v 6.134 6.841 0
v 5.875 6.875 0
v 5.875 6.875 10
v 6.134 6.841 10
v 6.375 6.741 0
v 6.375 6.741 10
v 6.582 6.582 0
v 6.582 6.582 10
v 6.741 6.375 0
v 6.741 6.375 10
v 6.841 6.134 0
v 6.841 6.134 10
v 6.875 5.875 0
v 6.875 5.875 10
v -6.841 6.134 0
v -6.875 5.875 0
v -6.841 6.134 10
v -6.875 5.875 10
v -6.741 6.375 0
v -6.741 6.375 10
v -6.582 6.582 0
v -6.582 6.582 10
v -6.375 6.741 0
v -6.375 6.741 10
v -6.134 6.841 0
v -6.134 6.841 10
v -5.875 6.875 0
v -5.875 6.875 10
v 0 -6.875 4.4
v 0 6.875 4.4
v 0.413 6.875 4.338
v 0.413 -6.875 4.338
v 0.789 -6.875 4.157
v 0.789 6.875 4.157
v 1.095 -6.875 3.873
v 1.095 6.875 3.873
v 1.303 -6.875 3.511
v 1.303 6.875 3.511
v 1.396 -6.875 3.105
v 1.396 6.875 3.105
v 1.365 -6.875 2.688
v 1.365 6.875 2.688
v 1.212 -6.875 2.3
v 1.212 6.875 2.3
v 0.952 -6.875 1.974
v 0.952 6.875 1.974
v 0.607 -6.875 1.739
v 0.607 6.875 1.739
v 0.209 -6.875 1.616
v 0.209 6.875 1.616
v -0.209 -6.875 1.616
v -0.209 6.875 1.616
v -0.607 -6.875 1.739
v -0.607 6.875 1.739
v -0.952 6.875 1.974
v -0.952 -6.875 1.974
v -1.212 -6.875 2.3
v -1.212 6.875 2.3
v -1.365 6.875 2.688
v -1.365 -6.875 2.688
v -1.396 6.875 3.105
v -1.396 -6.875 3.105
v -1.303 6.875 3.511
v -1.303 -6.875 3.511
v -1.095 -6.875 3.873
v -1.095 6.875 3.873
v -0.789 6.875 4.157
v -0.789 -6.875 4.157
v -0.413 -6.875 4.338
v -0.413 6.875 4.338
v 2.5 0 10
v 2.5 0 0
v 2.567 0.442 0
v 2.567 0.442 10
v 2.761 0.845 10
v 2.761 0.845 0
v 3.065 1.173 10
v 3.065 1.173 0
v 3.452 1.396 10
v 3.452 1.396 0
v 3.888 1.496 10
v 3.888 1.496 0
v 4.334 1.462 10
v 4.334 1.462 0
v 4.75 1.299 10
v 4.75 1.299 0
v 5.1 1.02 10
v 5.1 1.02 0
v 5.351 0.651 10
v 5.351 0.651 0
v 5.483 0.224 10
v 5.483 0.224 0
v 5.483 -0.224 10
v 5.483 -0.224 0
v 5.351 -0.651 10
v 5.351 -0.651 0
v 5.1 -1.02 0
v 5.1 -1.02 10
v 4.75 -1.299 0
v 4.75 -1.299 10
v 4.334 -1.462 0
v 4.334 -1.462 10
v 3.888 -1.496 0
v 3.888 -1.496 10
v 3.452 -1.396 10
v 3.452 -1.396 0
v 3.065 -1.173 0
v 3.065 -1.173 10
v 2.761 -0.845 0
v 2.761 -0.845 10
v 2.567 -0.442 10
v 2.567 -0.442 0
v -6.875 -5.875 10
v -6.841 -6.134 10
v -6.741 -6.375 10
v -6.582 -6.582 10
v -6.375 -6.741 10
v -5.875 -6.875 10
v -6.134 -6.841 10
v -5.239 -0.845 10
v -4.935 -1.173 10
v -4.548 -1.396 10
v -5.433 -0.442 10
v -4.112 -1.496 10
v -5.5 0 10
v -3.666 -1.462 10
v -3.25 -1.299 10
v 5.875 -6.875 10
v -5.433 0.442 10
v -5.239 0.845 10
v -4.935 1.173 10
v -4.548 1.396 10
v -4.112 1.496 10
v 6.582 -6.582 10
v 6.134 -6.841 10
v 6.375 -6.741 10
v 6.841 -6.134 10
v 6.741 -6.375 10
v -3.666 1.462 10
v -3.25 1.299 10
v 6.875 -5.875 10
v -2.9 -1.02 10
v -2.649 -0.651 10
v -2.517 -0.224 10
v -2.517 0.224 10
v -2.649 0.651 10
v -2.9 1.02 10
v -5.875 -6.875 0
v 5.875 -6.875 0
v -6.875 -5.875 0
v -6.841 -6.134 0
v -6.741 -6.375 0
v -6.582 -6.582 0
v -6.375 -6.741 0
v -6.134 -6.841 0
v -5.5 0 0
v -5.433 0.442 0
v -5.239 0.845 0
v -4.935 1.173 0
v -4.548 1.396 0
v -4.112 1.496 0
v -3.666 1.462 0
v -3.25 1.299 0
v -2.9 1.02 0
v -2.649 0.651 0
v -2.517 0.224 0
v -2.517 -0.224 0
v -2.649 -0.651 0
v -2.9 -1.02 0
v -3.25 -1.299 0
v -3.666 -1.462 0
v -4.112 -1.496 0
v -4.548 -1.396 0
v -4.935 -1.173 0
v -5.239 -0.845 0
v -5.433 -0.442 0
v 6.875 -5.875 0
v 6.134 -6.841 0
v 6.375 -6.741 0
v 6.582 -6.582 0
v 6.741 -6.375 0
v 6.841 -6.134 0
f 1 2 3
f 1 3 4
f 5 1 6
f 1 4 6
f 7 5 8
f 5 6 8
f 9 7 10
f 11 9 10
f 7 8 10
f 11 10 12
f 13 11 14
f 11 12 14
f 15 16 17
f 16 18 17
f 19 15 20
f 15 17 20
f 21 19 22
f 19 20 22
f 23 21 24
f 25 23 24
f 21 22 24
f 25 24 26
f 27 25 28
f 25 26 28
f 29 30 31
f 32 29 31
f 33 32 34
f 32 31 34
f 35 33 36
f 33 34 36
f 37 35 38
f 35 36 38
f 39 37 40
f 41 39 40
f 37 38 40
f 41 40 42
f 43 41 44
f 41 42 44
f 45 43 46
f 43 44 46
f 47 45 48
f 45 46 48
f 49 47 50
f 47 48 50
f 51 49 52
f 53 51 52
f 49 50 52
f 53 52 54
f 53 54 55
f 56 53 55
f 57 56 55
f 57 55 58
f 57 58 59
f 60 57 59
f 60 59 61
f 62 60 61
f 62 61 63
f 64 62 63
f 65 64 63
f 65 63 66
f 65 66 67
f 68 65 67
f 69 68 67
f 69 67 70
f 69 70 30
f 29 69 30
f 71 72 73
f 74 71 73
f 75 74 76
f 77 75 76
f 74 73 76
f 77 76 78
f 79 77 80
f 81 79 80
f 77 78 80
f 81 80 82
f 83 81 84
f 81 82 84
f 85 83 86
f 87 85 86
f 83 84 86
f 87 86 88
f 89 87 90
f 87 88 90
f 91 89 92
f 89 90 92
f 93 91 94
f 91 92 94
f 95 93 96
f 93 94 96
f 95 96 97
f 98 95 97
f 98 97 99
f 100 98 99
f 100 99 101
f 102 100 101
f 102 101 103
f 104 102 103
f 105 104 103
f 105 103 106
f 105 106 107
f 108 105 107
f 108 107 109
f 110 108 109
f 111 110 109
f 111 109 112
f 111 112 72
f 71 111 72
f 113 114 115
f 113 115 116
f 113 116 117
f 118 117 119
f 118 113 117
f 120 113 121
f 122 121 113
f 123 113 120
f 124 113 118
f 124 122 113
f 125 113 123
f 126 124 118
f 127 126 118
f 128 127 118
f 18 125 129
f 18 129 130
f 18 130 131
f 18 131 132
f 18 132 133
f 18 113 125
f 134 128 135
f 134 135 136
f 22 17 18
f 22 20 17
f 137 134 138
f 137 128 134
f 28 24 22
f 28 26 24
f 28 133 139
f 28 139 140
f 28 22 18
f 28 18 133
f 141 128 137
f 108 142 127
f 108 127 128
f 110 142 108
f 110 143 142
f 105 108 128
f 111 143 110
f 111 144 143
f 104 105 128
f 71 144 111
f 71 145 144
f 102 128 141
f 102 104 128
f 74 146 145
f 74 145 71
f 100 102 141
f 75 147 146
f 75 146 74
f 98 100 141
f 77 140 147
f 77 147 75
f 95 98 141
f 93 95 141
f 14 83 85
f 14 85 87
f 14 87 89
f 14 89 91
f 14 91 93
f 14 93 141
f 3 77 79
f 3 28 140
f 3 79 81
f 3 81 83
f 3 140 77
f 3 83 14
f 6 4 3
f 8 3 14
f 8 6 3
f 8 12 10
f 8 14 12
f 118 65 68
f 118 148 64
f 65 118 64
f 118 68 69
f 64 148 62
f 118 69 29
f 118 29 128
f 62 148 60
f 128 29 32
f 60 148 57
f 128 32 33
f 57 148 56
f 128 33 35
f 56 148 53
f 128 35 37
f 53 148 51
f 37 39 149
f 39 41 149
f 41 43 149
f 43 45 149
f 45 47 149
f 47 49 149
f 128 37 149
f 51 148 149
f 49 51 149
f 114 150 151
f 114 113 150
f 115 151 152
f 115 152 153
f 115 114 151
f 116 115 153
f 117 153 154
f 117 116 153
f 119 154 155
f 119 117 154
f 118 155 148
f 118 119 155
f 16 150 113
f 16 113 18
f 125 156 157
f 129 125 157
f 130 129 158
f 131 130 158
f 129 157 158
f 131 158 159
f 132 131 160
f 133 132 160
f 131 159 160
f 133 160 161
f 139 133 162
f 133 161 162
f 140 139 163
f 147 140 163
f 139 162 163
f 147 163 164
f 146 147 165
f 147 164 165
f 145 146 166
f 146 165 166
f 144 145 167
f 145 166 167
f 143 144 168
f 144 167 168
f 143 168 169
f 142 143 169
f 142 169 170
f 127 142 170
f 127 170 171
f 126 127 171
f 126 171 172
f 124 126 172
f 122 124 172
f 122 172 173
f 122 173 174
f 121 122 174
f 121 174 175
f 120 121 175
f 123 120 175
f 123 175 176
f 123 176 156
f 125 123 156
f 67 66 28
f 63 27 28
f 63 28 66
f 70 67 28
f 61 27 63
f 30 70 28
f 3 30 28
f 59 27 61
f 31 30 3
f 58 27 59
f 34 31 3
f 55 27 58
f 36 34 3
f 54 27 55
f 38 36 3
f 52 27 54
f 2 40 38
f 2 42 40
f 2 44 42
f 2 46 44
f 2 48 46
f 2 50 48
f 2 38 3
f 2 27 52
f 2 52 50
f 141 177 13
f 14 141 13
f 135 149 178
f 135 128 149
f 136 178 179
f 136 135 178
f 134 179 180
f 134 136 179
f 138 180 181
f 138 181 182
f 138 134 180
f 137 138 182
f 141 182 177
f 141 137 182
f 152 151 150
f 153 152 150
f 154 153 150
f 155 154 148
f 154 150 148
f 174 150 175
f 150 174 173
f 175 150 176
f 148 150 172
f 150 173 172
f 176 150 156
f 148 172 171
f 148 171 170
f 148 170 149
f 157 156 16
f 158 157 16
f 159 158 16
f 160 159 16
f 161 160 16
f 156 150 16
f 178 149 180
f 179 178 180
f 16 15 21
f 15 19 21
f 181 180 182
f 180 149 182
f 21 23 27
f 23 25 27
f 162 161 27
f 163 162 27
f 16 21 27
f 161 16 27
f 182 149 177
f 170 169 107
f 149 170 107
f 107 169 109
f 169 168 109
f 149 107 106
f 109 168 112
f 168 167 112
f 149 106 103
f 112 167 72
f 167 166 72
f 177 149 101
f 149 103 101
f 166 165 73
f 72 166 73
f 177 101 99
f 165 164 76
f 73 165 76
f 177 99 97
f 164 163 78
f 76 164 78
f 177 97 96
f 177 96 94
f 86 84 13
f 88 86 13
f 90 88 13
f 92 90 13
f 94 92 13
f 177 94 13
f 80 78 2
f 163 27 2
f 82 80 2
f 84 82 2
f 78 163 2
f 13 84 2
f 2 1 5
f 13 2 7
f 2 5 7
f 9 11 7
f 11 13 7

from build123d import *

# Parameters (mm, degrees)
SKETCH1_W           = 13.75
SKETCH1_H           = 13.75
BOSS_EXTRUDE1_DEPTH = 10
SKETCH3_R           = 1.4
CUT_EXTRUDE1_DEPTH  = 19.339250939
SKETCH2_R           = 1.5
CUT_EXTRUDE2_DEPTH  = 14.947446003
FILLET1_R           = 1


with BuildPart() as part:
    # Sketch1 → Boss-Extrude1 (new body)
    with BuildSketch(Plane.XY):
        Rectangle(SKETCH1_W, SKETCH1_H)
    extrude(amount=BOSS_EXTRUDE1_DEPTH)

    # Sketch3 → Cut-Extrude1 (cut, through all)
    with BuildSketch(Plane(origin=(0, 6.875, 0), x_dir=(1, 0, 0), z_dir=(0, 1, 0))):
        with Locations(Location((0, -3, 0), (0, 0, 270))):
            Circle(SKETCH3_R)
    extrude(amount=-CUT_EXTRUDE1_DEPTH, mode=Mode.SUBTRACT)

    # Sketch2 → Cut-Extrude2 (cut, through all)
    with BuildSketch(Plane(origin=(0, 0, 0), x_dir=(-1, 0, 0), z_dir=(0, 0, -1))):
        with Locations((4, 0)):
            Circle(SKETCH2_R)
        with Locations((-4, 0)):
            Circle(SKETCH2_R)
    extrude(amount=-CUT_EXTRUDE2_DEPTH, mode=Mode.SUBTRACT)

    # Fillet1
    fillet1_edges = [part.edges().sort_by_distance(p)[0] for p in [
        (-6.875, 6.875, 5),
        (-6.875, -6.875, 5),
        (6.875, -6.875, 5),
        (6.875, 6.875, 5),
    ]]
    fillet(fillet1_edges, radius=FILLET1_R)


solid = part.part
